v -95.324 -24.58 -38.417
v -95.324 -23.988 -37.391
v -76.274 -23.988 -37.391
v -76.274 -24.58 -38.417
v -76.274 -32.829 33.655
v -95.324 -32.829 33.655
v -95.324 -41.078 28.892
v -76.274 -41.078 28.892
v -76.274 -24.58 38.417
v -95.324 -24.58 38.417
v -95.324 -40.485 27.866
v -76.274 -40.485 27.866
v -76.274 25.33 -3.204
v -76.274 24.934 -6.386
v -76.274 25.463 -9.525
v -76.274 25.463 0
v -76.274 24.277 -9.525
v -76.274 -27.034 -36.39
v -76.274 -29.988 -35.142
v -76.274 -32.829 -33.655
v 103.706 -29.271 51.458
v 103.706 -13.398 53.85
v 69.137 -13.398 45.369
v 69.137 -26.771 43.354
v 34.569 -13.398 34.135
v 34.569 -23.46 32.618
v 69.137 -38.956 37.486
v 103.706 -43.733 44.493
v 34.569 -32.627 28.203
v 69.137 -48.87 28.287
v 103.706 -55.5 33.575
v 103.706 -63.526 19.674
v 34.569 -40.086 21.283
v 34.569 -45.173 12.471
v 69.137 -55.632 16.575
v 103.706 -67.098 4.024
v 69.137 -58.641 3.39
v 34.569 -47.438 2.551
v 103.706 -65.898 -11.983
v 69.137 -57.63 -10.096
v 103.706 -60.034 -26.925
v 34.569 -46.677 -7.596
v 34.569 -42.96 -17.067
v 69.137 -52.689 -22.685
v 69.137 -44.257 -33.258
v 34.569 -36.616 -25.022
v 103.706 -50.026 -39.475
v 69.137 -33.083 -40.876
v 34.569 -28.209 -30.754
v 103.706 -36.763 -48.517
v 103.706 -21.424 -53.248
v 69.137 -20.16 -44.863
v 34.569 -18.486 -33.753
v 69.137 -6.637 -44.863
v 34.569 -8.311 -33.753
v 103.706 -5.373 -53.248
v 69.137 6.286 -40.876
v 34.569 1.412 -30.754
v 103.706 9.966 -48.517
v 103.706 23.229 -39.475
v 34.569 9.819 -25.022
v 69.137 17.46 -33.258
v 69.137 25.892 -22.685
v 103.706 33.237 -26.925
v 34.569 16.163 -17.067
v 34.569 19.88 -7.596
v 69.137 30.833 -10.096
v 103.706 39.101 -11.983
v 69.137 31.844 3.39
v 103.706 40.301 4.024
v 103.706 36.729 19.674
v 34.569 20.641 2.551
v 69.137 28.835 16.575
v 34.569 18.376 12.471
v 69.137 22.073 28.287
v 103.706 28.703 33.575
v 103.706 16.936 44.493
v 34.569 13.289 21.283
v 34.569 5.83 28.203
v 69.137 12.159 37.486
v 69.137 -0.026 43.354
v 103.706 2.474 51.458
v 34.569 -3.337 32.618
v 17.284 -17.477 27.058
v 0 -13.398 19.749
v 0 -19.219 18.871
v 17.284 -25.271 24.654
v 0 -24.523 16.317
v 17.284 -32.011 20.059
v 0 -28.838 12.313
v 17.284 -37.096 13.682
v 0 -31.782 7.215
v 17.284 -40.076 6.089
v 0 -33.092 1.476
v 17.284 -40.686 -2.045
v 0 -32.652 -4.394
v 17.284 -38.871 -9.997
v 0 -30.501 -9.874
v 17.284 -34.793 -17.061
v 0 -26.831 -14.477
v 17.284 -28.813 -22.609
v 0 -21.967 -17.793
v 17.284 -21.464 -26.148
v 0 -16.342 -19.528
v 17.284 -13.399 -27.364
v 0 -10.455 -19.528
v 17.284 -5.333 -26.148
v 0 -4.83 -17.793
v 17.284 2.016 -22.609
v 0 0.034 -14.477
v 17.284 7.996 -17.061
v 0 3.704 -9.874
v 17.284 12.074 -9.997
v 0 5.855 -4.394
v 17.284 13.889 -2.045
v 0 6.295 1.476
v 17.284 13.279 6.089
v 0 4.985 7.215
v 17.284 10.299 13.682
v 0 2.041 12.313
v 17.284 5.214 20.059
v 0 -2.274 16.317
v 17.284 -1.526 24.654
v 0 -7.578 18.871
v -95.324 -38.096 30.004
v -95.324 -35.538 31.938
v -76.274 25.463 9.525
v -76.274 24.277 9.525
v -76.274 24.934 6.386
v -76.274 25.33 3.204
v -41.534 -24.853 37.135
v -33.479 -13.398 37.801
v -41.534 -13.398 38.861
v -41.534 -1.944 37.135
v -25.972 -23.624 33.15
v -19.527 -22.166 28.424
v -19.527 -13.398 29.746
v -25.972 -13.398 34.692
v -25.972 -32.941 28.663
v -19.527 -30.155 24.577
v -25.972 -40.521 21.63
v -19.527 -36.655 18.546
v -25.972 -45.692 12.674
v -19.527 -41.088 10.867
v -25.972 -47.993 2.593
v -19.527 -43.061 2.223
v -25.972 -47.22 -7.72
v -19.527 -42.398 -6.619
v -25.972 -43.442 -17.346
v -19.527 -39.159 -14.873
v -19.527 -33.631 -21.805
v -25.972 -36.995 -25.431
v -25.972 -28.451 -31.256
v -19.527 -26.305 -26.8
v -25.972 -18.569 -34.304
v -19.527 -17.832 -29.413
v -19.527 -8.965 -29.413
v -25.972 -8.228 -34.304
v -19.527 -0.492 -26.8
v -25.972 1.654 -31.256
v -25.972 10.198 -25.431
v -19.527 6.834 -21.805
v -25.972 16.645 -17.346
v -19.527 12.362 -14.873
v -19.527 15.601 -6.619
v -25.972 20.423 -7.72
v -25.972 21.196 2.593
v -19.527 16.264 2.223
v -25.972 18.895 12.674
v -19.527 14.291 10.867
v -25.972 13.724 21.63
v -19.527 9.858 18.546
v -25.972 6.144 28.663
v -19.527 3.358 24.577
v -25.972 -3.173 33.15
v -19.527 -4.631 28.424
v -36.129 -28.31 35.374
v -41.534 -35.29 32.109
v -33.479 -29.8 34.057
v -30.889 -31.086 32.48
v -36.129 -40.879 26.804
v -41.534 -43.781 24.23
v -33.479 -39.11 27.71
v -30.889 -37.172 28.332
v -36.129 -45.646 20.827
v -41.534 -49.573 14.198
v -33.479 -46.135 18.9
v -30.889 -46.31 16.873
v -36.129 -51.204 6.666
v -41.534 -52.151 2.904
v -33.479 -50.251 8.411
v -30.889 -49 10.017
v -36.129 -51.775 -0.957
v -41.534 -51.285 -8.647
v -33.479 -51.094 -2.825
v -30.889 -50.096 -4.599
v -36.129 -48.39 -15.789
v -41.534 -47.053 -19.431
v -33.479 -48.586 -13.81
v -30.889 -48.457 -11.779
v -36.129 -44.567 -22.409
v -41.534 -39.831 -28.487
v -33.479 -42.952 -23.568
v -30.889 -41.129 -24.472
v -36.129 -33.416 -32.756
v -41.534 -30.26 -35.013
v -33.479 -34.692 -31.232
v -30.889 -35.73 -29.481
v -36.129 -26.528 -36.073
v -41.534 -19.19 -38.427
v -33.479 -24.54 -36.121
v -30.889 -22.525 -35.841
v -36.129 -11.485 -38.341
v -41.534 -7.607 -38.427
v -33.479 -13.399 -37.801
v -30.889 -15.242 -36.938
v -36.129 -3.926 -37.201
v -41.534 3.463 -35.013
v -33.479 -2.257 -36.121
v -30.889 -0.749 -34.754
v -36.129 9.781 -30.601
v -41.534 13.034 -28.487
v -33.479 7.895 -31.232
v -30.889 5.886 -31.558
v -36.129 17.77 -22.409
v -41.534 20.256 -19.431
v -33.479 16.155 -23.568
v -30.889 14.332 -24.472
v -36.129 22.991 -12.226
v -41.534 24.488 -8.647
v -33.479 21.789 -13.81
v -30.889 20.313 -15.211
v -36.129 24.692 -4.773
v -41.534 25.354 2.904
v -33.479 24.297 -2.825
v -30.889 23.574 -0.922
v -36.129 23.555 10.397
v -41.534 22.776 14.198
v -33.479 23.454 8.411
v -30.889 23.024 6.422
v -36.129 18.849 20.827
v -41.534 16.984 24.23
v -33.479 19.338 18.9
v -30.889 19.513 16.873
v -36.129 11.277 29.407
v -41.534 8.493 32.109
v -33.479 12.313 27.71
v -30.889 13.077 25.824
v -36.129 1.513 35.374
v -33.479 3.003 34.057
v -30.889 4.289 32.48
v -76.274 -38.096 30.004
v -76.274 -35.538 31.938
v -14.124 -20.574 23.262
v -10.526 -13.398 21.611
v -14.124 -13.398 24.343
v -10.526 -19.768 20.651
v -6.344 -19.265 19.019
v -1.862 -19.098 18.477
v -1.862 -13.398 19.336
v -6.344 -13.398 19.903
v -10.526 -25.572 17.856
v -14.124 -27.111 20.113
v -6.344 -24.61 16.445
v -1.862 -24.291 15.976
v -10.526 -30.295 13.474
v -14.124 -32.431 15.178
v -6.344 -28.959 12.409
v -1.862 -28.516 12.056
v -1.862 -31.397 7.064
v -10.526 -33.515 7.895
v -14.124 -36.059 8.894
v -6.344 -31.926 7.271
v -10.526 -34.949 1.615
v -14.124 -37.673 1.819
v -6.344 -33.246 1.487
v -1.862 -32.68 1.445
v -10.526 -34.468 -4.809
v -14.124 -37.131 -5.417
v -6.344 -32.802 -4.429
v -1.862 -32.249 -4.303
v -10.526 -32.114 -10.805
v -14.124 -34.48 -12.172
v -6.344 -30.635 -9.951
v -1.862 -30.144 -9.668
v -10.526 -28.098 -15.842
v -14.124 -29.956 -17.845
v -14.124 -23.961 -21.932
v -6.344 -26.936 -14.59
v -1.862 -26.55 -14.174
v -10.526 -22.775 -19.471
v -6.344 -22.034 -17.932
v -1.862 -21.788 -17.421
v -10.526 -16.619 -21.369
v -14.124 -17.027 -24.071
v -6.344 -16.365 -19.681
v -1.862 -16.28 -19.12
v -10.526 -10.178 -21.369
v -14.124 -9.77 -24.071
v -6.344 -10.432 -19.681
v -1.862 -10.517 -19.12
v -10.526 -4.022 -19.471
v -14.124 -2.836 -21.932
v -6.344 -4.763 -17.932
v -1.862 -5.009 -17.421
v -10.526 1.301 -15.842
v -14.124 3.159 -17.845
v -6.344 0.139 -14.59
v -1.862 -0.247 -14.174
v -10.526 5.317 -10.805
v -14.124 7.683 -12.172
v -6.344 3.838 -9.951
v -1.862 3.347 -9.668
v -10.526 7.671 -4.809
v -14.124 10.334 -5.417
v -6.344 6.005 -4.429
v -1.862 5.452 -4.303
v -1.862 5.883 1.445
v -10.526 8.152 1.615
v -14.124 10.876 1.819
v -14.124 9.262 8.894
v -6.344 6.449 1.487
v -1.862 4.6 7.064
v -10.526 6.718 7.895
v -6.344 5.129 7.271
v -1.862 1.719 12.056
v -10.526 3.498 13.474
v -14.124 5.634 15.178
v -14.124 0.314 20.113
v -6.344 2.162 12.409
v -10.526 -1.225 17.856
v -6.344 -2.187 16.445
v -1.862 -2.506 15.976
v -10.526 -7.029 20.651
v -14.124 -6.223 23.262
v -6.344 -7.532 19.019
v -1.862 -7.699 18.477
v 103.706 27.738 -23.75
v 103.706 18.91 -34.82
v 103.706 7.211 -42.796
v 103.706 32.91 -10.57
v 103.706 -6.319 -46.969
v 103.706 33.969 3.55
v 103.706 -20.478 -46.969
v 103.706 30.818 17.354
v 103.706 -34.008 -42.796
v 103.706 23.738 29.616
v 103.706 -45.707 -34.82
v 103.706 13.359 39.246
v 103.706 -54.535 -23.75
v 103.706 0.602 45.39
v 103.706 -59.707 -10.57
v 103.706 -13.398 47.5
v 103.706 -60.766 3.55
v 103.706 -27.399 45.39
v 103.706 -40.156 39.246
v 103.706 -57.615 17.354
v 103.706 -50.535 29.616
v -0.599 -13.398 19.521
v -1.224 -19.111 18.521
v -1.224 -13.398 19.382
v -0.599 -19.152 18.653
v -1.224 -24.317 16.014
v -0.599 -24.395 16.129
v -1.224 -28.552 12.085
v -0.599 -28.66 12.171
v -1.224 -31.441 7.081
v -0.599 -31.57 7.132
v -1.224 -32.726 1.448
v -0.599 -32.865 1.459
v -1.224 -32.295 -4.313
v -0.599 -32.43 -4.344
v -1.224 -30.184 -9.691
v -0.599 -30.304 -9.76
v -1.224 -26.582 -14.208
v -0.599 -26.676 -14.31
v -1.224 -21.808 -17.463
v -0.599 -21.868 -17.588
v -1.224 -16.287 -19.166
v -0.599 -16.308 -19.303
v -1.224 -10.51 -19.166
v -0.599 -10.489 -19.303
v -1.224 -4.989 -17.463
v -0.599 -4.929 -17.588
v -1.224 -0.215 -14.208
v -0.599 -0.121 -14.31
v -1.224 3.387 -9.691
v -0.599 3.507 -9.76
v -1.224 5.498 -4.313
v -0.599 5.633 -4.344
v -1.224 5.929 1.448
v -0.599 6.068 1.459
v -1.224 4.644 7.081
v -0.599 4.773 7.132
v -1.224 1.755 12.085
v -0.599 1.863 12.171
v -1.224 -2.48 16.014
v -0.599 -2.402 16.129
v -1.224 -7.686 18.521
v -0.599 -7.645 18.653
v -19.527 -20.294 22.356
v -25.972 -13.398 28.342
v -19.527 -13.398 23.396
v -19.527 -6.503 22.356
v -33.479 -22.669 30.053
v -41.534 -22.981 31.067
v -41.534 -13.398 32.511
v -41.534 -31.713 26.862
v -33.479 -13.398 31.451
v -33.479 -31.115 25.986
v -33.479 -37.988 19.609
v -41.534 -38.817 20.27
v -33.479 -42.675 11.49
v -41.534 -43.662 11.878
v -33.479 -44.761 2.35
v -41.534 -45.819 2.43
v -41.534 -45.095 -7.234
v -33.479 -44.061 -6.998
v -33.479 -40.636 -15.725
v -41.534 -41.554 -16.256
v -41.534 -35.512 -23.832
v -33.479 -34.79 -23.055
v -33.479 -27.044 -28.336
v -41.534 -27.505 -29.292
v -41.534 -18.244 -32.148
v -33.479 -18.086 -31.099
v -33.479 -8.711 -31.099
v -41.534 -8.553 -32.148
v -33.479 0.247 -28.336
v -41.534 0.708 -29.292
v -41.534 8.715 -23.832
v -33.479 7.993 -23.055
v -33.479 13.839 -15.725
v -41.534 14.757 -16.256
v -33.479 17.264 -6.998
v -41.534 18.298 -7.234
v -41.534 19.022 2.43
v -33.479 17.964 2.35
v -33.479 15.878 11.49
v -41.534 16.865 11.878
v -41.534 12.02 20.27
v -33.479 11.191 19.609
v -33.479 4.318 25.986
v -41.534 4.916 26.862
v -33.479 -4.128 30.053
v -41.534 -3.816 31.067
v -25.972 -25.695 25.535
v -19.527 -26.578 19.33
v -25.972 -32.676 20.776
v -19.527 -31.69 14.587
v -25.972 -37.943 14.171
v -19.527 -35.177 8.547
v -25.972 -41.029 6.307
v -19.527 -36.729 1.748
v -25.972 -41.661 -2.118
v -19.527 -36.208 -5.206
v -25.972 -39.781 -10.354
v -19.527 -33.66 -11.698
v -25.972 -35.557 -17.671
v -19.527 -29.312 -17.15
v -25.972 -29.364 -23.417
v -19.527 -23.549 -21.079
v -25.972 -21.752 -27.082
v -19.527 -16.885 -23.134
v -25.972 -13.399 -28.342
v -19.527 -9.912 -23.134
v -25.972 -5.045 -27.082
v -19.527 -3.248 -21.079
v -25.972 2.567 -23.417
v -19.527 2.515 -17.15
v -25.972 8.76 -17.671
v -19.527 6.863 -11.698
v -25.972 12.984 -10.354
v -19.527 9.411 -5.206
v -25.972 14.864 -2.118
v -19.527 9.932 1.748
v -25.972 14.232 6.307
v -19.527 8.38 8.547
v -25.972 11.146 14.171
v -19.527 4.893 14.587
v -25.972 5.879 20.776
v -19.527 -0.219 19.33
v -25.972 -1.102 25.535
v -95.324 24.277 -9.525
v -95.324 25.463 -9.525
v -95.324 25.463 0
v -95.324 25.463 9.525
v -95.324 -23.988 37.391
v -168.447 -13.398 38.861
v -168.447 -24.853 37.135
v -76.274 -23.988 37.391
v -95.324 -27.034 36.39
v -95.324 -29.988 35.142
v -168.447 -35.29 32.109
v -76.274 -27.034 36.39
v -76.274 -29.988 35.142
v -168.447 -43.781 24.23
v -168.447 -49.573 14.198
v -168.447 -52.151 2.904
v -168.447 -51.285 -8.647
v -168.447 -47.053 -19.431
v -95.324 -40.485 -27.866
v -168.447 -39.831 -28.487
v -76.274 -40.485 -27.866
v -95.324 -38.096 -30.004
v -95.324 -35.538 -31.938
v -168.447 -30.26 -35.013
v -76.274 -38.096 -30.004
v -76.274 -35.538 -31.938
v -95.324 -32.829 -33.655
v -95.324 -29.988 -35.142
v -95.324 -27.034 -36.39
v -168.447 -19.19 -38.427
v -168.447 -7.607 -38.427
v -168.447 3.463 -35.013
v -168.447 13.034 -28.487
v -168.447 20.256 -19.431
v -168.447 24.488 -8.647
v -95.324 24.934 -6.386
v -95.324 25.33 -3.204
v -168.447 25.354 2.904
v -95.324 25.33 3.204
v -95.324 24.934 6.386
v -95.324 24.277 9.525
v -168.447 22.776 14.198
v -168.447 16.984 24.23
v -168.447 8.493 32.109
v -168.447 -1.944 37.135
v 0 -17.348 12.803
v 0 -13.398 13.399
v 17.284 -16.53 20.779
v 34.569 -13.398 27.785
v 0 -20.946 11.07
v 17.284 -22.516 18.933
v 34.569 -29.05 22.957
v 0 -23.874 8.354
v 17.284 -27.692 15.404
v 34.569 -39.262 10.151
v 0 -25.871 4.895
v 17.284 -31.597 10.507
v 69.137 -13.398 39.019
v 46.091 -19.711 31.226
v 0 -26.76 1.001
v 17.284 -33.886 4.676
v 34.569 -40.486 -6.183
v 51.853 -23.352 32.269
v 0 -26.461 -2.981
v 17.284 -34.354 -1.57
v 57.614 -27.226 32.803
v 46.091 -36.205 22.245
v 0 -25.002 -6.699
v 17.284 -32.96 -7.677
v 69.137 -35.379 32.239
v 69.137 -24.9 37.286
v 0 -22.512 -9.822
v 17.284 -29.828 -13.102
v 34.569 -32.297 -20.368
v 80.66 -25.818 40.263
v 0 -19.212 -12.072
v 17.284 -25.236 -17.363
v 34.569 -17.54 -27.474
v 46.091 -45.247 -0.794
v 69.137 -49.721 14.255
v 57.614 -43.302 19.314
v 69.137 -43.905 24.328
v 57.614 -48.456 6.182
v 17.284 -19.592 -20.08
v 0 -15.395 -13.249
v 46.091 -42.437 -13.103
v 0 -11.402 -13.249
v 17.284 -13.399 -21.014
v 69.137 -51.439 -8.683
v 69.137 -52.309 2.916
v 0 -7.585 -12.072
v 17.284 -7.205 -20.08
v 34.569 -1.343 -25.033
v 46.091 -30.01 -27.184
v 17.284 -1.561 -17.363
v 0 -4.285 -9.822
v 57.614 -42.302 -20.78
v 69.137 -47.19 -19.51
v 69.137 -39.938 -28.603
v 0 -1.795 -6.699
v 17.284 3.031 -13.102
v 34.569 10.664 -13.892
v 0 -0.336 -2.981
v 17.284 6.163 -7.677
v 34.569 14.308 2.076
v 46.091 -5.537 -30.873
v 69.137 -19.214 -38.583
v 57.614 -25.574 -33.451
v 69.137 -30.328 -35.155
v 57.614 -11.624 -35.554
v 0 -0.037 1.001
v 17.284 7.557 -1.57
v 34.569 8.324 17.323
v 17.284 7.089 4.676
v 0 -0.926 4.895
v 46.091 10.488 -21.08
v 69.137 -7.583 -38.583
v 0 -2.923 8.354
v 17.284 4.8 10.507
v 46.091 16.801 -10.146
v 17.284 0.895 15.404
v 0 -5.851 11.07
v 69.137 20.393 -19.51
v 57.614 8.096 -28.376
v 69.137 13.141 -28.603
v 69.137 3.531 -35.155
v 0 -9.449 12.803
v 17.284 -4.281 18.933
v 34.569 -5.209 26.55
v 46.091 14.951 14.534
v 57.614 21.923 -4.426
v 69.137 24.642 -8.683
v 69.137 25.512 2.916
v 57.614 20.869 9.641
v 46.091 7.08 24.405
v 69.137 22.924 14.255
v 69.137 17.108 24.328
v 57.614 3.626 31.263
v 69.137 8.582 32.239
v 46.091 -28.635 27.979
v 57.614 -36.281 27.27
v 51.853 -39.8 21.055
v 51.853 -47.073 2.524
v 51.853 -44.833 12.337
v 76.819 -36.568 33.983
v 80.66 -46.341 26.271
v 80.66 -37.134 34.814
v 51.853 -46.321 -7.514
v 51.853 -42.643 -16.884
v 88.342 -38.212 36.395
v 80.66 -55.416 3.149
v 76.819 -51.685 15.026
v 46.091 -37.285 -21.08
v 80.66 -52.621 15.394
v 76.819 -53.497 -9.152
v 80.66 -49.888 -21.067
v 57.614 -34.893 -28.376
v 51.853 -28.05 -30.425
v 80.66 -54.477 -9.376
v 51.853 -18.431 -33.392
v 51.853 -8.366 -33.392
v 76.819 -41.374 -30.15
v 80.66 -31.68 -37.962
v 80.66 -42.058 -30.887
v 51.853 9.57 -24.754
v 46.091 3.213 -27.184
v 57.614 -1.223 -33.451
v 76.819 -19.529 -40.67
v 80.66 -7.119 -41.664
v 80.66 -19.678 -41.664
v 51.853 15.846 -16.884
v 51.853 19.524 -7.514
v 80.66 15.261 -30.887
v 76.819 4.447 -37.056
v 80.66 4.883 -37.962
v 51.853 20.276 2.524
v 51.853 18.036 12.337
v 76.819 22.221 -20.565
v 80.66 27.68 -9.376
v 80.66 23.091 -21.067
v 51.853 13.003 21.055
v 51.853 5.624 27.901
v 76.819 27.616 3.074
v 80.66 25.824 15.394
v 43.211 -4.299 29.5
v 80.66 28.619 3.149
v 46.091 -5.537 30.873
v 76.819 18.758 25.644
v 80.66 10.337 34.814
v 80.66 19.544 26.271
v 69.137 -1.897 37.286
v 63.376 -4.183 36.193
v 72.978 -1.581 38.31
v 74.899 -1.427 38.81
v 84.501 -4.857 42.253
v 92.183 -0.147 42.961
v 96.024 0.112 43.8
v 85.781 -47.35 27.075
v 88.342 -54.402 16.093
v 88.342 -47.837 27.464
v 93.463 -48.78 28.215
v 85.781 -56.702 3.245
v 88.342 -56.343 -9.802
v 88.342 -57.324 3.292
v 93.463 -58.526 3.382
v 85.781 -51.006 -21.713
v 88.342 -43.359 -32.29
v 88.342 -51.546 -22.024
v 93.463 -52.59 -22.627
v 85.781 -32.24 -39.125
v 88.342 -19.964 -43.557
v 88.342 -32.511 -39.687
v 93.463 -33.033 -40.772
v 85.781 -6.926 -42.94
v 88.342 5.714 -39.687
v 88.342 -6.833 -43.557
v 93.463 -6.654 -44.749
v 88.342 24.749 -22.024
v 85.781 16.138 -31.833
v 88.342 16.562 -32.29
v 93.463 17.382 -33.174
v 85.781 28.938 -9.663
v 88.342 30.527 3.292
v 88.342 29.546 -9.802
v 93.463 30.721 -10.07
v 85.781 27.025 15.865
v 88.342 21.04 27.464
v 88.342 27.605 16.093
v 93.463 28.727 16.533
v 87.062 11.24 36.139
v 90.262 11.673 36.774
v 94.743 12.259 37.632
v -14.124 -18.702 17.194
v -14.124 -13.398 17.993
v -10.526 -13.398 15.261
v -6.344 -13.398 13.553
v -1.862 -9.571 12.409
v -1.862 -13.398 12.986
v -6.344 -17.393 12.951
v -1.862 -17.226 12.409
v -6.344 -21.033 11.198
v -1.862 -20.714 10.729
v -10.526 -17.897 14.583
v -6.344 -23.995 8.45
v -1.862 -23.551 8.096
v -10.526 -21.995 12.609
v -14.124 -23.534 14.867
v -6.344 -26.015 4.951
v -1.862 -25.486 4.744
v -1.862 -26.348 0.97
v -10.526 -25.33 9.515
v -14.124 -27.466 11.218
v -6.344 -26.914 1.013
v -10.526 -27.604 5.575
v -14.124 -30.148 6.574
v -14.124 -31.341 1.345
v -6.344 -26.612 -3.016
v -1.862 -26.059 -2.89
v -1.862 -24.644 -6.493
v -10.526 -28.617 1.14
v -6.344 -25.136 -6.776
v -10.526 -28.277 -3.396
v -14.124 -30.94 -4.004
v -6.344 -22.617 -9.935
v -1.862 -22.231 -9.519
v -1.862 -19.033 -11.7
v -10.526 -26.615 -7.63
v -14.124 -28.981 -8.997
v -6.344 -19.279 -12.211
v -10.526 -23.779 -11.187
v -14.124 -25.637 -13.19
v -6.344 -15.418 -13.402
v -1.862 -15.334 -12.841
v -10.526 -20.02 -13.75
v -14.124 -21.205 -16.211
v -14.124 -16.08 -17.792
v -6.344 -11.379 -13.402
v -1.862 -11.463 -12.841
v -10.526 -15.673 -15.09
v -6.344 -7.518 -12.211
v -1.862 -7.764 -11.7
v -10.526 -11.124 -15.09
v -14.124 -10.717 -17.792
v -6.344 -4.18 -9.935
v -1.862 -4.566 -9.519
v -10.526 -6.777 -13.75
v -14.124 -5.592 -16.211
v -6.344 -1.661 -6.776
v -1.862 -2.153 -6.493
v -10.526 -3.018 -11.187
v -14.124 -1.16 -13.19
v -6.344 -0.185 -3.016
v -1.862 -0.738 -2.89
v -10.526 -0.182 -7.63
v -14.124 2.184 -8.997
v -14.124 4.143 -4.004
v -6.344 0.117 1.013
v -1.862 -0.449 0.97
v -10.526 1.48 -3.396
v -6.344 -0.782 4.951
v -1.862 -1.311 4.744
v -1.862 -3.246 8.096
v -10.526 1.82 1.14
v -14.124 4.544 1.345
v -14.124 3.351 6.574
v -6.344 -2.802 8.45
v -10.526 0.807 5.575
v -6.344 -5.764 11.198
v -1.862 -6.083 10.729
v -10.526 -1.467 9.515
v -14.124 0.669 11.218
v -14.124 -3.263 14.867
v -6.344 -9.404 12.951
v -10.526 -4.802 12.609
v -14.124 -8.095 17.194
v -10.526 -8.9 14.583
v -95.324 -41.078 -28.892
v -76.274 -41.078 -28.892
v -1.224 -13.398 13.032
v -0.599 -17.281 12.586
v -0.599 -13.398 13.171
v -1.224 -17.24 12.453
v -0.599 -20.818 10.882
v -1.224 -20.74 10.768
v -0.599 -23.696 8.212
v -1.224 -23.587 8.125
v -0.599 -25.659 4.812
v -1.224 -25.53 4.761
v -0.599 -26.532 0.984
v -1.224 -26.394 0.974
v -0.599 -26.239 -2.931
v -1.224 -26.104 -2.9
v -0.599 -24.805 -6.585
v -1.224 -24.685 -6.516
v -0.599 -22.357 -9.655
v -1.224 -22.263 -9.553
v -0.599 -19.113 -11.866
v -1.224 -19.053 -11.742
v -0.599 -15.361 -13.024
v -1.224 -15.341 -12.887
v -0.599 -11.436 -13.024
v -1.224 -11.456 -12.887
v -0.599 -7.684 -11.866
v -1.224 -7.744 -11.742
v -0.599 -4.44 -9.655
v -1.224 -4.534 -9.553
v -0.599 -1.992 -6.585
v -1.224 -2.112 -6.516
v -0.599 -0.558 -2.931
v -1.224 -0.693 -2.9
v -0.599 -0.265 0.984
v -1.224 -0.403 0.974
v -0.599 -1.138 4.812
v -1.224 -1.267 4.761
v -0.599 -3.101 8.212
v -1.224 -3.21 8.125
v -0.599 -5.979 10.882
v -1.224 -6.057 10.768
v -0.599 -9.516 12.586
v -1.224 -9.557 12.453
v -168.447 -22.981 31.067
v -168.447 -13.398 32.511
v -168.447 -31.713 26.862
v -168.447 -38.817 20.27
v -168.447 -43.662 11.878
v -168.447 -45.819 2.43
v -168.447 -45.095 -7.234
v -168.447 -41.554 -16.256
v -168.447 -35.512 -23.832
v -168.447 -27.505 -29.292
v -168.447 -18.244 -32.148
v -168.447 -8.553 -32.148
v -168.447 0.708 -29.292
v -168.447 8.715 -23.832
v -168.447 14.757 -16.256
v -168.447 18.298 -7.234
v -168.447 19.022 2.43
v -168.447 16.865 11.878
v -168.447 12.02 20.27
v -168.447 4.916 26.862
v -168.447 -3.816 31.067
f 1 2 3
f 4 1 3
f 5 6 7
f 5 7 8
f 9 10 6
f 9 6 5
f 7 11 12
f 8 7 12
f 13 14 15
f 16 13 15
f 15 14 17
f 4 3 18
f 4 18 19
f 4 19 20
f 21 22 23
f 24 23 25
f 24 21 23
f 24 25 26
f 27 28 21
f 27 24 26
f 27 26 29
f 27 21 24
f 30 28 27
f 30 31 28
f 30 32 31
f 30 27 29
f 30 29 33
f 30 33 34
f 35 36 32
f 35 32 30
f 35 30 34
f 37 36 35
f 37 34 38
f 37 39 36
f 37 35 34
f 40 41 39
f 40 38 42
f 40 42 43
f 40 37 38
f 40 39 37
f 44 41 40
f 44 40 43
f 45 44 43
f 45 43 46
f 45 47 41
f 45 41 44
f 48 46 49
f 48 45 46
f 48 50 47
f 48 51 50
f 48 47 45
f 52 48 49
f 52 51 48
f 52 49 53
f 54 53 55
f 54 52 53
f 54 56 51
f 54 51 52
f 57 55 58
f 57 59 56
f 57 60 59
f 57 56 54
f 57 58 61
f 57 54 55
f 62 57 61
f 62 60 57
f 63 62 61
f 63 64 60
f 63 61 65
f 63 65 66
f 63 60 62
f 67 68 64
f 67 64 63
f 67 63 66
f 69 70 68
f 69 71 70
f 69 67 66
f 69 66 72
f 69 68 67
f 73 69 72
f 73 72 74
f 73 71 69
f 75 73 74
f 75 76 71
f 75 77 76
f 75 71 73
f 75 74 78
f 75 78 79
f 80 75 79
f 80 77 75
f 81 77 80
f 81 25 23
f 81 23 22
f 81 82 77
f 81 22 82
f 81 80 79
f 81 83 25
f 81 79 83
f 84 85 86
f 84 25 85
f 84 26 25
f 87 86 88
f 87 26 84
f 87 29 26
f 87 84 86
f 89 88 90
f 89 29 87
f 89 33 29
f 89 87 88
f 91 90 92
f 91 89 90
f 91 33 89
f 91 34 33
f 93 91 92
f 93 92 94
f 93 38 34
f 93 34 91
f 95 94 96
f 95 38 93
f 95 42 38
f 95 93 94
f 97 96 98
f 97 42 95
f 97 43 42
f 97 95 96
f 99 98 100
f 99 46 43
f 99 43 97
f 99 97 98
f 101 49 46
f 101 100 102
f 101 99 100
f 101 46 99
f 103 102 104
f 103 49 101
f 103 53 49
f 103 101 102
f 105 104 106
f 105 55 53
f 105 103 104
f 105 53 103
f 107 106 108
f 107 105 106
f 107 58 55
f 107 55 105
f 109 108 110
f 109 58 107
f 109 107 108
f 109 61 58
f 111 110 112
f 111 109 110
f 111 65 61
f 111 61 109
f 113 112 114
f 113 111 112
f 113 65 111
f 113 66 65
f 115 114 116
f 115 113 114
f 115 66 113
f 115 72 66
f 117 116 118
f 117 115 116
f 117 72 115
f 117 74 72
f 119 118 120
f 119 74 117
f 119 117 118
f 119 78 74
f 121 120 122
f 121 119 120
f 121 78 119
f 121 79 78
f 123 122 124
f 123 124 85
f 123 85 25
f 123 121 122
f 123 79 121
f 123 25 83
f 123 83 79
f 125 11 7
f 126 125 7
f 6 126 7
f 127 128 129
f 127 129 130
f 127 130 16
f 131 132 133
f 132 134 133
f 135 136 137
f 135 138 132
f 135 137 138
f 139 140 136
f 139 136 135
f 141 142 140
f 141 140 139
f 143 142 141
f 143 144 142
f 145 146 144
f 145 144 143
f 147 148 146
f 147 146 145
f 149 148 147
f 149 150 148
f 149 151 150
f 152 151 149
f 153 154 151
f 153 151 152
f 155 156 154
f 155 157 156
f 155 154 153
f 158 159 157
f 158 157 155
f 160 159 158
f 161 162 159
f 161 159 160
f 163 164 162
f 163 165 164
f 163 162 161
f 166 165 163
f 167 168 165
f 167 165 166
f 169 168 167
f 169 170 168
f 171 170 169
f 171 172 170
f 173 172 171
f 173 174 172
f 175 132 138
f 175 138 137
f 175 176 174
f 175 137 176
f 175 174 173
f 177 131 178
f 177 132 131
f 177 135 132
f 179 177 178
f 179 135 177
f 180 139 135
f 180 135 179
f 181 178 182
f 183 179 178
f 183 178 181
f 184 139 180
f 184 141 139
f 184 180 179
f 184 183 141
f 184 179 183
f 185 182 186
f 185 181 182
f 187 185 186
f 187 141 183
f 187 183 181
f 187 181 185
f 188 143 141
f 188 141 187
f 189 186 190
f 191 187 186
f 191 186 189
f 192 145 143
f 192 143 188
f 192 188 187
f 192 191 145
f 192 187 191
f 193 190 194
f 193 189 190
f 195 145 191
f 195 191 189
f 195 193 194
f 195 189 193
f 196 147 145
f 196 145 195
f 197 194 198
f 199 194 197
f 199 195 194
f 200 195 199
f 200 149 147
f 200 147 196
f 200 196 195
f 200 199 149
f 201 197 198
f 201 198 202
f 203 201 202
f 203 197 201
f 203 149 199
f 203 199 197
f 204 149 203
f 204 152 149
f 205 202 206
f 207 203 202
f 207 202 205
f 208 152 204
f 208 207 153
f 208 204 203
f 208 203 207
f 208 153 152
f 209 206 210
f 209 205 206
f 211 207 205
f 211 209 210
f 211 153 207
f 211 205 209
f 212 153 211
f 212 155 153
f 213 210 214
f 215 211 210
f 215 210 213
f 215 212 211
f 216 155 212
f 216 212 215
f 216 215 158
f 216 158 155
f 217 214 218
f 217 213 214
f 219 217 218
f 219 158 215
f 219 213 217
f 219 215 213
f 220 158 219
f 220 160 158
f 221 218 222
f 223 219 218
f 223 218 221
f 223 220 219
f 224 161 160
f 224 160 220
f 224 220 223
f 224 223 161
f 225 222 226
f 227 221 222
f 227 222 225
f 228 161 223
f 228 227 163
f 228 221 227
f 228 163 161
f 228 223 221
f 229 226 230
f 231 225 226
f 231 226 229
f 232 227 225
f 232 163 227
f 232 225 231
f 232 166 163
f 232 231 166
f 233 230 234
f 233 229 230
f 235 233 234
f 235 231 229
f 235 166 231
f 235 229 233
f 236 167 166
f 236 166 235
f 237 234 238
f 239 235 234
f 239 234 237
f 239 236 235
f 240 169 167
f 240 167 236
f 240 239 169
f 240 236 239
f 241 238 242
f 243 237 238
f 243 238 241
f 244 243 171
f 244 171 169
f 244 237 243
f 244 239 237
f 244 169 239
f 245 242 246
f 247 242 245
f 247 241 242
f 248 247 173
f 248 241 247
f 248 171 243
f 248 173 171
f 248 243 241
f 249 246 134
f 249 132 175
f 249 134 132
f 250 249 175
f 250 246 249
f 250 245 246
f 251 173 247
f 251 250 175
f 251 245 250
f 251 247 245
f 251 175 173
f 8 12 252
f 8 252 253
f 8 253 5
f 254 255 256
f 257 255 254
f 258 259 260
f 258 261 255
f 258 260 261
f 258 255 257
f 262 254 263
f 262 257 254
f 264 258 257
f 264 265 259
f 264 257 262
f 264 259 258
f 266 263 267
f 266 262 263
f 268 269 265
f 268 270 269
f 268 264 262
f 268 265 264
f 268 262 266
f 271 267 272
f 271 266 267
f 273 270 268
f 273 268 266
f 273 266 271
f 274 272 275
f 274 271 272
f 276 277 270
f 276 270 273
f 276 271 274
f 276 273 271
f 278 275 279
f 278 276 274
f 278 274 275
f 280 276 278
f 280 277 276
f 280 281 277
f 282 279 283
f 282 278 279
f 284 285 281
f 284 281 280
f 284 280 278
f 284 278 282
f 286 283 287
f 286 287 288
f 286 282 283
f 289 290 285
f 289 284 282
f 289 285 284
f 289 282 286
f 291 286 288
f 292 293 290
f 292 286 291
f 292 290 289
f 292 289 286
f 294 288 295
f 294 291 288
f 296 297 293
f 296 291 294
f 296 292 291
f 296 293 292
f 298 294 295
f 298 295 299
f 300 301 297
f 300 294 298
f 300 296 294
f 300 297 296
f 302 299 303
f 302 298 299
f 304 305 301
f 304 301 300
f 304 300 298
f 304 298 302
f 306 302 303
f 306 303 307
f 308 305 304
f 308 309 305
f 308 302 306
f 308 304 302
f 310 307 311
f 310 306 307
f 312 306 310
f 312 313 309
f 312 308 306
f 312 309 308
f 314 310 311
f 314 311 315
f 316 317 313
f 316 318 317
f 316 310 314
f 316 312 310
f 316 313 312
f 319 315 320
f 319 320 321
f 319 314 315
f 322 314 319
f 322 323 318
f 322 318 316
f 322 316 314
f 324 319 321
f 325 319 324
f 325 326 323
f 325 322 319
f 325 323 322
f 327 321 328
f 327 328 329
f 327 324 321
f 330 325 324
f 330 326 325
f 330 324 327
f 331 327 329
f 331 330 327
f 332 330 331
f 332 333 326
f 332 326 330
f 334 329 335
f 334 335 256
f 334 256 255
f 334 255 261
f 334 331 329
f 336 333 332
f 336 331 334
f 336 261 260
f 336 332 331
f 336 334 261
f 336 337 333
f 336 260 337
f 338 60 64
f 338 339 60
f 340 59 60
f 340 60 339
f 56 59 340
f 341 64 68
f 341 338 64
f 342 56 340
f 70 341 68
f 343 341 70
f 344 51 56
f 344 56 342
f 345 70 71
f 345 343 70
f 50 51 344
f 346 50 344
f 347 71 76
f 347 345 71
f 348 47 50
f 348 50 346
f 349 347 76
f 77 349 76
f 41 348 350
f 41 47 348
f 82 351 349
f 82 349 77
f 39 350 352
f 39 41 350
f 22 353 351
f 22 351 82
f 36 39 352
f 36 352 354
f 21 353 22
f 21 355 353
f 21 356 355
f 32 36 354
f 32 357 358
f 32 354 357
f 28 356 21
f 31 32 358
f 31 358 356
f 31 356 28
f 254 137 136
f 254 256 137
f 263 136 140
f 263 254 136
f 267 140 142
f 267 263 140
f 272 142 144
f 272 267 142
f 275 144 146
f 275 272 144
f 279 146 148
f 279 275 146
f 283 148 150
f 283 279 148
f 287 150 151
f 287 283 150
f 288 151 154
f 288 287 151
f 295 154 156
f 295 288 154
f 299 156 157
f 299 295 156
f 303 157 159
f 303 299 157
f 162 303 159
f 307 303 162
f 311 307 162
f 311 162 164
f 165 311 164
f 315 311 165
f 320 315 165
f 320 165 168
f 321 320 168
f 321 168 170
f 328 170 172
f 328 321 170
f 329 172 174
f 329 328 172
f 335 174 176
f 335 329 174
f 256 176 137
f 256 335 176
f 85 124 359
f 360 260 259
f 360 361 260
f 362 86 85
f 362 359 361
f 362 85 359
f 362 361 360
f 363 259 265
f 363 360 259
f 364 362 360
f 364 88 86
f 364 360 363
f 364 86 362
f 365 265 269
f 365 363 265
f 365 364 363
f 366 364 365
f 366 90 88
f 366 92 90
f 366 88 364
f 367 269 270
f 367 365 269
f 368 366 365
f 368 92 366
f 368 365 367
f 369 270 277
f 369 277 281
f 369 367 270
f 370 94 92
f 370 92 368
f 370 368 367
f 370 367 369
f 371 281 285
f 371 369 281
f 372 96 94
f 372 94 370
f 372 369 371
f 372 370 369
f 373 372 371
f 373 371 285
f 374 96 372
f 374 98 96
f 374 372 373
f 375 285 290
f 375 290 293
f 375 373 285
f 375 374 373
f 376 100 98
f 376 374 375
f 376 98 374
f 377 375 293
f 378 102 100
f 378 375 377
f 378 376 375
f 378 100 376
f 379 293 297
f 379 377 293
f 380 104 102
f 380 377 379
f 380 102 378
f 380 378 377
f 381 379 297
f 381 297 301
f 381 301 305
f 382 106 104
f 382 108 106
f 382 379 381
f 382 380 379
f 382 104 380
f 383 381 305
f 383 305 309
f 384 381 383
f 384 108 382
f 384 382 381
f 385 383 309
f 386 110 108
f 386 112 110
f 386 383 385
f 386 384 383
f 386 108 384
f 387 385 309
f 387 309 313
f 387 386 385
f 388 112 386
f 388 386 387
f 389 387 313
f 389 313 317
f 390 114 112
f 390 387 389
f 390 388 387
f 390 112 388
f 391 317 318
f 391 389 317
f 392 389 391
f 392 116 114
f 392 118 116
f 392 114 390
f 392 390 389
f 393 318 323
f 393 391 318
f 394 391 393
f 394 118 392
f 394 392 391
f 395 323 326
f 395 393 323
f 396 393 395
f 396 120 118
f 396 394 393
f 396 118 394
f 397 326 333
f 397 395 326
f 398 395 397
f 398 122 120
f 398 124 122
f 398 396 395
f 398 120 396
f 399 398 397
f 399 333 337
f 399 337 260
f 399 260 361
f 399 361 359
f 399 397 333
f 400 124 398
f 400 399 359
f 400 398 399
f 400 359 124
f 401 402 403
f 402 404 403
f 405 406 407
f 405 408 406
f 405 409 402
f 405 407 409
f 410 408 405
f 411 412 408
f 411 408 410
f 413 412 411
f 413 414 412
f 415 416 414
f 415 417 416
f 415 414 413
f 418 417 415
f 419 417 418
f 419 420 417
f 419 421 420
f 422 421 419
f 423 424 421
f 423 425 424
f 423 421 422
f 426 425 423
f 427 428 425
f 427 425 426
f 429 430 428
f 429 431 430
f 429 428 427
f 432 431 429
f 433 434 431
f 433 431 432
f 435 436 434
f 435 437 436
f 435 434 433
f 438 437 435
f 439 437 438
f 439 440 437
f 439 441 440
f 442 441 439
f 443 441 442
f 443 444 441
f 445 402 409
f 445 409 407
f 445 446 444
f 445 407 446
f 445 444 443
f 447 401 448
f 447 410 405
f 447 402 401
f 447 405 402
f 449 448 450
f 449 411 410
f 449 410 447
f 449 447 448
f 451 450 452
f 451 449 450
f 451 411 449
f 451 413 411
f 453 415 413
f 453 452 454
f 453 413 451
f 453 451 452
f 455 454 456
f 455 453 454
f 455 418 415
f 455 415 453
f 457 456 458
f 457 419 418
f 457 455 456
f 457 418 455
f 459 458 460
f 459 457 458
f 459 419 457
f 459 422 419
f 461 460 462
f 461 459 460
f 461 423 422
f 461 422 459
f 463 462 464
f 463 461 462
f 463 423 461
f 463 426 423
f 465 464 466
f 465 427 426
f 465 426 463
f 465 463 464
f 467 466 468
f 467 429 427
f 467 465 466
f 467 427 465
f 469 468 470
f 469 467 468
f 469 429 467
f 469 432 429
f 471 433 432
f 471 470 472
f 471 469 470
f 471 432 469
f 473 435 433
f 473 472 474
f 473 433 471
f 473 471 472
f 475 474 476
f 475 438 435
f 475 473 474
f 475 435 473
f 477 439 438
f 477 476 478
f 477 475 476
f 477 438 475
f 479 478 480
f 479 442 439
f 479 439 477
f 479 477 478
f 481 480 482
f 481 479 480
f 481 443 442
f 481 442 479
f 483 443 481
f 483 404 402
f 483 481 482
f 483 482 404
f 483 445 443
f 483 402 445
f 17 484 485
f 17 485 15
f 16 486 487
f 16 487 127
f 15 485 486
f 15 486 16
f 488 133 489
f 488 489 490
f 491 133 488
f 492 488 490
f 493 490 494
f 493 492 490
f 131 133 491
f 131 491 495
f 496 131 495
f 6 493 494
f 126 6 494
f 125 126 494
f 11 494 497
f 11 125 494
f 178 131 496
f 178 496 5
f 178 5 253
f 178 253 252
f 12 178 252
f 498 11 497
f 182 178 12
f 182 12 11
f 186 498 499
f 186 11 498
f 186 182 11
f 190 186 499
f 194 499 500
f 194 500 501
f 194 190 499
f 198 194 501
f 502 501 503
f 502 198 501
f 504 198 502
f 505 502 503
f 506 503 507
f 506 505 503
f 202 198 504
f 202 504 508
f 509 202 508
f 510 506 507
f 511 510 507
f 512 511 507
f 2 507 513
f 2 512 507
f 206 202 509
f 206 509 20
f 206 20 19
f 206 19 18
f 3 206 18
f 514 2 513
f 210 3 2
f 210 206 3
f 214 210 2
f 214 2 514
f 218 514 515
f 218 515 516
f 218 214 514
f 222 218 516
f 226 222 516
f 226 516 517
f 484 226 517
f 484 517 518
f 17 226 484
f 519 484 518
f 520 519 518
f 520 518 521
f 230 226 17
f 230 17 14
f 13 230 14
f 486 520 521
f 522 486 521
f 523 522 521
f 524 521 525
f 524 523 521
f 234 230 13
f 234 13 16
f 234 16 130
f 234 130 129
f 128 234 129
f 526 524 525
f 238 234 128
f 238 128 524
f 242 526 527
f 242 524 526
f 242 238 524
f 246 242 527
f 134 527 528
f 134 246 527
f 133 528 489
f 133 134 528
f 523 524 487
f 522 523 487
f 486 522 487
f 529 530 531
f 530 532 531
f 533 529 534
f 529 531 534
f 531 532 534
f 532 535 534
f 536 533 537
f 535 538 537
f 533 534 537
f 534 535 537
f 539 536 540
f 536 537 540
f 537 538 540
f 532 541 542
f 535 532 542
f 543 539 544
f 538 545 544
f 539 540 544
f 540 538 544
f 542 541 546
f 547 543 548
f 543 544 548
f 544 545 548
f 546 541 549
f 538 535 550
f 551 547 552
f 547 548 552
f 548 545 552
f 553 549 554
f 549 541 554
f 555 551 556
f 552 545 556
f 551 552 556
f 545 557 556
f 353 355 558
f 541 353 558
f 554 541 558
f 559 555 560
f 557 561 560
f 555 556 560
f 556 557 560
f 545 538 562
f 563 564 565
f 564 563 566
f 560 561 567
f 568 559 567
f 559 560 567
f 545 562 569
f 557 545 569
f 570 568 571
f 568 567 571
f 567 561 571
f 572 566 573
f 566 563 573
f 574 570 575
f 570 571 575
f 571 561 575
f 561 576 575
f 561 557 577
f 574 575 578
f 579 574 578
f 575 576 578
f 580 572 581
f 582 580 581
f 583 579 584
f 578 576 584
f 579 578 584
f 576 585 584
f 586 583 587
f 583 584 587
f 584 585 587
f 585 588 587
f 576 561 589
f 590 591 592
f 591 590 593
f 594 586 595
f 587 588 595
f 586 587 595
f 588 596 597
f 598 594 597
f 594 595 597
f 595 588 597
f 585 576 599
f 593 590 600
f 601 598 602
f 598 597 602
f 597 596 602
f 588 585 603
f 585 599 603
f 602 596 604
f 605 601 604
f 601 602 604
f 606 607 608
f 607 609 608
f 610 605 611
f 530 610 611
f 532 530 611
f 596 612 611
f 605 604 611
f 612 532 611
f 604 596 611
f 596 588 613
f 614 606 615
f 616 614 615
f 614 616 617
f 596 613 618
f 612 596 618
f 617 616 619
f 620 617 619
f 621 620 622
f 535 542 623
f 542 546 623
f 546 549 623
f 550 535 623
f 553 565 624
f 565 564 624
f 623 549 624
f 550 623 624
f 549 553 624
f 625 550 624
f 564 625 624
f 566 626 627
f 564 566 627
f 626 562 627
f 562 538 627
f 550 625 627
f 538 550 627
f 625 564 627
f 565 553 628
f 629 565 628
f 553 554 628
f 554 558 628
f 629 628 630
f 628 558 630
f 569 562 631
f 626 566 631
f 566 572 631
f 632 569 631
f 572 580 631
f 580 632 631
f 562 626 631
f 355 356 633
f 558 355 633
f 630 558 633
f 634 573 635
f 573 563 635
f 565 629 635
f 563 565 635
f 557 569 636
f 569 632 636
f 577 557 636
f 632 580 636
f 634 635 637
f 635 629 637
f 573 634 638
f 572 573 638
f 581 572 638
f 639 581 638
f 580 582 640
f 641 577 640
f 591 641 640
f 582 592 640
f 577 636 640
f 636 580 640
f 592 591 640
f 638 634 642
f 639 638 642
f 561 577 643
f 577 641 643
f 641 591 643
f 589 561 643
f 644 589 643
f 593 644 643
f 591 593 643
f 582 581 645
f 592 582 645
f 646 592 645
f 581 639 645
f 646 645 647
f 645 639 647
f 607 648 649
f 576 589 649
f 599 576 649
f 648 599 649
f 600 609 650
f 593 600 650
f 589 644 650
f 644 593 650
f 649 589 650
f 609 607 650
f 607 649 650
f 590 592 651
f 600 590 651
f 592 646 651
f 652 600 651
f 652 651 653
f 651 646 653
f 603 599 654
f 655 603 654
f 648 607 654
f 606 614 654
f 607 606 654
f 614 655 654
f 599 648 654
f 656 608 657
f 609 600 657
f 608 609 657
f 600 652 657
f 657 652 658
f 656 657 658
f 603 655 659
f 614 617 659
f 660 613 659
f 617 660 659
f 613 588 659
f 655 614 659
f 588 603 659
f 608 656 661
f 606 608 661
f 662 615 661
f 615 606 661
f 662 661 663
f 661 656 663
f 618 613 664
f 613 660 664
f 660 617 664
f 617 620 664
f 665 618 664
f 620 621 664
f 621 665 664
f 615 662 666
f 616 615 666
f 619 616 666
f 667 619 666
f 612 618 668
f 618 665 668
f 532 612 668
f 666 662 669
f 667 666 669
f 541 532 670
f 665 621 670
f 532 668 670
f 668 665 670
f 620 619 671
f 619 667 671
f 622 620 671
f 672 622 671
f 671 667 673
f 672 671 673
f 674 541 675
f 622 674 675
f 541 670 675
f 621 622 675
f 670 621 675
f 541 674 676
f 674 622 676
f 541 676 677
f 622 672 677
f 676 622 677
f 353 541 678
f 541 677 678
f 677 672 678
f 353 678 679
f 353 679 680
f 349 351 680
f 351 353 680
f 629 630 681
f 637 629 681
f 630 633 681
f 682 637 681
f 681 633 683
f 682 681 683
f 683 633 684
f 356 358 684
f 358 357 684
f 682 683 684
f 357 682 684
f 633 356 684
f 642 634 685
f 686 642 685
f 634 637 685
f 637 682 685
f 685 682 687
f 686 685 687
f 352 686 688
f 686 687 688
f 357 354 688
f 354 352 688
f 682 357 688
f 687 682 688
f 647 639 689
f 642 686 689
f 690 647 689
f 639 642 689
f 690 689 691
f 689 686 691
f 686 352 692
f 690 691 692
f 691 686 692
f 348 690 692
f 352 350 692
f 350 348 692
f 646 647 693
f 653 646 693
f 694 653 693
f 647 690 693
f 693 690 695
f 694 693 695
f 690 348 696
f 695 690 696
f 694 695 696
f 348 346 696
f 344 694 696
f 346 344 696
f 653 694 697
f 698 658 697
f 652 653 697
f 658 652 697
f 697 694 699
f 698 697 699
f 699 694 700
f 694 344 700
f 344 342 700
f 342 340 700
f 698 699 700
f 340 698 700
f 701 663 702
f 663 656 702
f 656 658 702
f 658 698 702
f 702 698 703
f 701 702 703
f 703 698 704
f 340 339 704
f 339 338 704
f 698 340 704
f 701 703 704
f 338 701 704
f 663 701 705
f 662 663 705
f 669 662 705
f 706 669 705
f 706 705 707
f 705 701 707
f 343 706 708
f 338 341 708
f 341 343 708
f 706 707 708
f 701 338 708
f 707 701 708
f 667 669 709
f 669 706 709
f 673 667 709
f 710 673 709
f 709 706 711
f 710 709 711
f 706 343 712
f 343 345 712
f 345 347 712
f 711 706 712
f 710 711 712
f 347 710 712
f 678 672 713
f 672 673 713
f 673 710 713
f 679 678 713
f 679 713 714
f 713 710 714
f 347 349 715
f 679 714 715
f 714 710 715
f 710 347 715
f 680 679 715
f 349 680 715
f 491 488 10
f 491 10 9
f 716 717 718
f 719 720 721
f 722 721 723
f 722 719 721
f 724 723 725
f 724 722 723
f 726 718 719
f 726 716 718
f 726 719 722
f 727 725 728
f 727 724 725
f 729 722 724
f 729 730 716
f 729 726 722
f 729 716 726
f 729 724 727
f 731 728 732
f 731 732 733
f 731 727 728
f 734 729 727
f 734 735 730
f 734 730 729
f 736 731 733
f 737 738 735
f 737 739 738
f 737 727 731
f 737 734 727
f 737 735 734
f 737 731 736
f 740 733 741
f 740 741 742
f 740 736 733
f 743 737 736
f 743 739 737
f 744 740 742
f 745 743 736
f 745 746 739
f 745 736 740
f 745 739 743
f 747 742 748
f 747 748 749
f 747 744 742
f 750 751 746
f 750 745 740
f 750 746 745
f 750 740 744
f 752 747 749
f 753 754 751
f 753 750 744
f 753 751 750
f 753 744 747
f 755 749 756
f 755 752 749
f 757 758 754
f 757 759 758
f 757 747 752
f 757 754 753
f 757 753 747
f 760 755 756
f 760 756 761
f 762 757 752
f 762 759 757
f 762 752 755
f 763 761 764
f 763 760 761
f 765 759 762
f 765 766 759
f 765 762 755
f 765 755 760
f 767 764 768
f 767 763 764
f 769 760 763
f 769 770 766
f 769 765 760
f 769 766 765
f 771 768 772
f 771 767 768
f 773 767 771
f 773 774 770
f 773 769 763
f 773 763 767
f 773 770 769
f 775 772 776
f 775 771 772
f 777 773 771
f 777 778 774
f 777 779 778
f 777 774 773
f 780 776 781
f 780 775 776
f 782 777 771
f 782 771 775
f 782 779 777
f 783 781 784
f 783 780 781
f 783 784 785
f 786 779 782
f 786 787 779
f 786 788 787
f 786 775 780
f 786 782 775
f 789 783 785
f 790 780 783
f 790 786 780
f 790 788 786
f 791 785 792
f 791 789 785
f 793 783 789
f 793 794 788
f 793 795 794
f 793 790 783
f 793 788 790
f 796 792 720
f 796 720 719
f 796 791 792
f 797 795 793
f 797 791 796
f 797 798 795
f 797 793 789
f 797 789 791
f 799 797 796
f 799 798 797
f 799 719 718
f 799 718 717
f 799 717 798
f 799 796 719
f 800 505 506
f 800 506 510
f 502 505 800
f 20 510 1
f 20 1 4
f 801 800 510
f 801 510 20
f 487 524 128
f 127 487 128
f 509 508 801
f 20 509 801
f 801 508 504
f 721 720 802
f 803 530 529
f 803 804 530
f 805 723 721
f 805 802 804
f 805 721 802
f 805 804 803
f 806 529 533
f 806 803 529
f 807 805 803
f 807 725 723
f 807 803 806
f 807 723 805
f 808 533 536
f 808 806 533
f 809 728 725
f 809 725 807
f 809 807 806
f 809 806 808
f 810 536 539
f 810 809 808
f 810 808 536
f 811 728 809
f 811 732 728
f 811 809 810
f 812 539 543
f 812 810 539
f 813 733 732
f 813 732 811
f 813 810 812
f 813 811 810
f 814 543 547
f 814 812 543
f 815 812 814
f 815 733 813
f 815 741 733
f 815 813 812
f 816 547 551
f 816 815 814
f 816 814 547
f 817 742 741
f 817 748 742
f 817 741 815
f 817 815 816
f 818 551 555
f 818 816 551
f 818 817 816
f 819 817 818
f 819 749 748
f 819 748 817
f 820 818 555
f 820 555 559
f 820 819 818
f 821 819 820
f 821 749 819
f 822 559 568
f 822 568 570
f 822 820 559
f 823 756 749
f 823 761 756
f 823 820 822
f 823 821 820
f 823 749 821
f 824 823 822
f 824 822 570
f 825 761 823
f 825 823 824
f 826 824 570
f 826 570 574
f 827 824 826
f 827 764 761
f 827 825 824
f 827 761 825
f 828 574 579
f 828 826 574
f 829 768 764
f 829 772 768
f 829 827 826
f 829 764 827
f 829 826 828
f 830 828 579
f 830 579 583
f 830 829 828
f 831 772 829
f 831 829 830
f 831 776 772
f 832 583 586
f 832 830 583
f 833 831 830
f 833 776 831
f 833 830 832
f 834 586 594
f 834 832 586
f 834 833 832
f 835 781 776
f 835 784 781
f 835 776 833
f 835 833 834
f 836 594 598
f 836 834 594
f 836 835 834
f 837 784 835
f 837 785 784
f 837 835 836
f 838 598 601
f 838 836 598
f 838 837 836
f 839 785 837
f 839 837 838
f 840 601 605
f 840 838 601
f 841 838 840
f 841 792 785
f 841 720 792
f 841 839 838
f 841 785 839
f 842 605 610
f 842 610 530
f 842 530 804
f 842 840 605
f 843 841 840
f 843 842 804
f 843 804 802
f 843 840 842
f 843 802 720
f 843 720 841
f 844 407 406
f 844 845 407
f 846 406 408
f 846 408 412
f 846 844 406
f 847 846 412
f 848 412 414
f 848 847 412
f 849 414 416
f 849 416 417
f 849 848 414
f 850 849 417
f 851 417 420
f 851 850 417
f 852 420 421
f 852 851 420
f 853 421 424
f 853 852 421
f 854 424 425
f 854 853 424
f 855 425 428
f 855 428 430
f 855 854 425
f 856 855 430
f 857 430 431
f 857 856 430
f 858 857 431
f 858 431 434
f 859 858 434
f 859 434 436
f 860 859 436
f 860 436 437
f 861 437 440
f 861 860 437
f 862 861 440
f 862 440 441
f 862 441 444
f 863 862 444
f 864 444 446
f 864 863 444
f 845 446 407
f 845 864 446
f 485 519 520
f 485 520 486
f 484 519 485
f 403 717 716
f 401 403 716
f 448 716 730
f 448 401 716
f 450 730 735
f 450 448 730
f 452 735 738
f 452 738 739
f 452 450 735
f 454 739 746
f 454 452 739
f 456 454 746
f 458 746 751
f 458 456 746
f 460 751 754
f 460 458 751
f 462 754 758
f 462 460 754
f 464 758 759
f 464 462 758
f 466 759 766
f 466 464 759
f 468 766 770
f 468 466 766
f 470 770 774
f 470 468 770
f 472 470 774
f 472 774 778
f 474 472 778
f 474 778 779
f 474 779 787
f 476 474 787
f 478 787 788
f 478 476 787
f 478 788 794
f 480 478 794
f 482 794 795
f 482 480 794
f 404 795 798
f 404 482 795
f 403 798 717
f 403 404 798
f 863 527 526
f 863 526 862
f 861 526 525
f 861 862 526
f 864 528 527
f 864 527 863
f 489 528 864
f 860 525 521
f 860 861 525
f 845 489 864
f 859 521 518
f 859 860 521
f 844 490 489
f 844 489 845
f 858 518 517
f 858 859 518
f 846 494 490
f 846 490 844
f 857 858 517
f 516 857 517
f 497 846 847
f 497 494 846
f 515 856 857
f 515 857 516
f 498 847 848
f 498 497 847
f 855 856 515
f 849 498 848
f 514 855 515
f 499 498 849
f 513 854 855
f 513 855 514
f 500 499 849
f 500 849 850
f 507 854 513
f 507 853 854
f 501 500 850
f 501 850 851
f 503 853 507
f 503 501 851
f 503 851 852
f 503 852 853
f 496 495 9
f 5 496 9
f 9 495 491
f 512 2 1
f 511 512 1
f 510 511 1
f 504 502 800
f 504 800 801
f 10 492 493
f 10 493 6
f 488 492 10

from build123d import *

# Parameters (mm, degrees)
BOSS_EXTRUDE1_START = -1.185383
SKETCH2_W           = 19.05
SKETCH2_H           = 19.05
BOSS_EXTRUDE1_DEPTH = 1.185383
CIRPATTERN1_COUNT   = 3


with BuildPart() as part:
    # Sketch1 → Revolve1 (revolve)
    with BuildSketch(Plane.XY, mode=Mode.PRIVATE) as revolve1_sk:
        with BuildLine():
            Line((-14.12409666, 4.594554961), (-19.526618742, 9.997077044))
            ThreePointArc((-19.526618742, 9.997077044), (-29.623523347, 16.74361301), (-41.533634393, 19.112681394))
            Line((-41.533634393, 19.112681394), (-168.447274393, 19.112681394))
            Line((-168.447274393, 19.112681394), (-168.447274393, 25.462681394))
            Line((-168.447274393, 25.462681394), (-41.533634392, 25.462681394))
            ThreePointArc((-41.533634392, 25.462681394), (-29.623523346, 23.09361301), (-19.526618741, 16.347077044))
            Line((-19.526618741, 16.347077044), (-14.124096659, 10.944554962))
            ThreePointArc((-14.124096659, 10.944554962), (-8.491312805, 7.221332923), (-1.862483701, 5.937097346))
            ThreePointArc((-1.862483701, 5.937097346), (-0.908631777, 6.041561122), (-5.2e-08, 6.350000031))
            add(Edge.make_bspline(
                [(-5.2e-08, 6.350000031), (17.284276617, 14.409337901), (34.568553286, 21.376197316), (51.852829955, 27.377015197), (69.137106624, 32.507005795), (86.421383293, 36.843575686), (103.705659962, 40.451419137)],
                knots=[0.079490439, 0.079490439, 0.079490439, 0.079490439, 0.079490439, 0.079490439, 0.079490439, 0.916317313, 0.916317313, 0.916317313, 0.916317313, 0.916317313, 0.916317313, 0.916317313], degree=6))
            Line((103.705659962, 40.451419137), (103.705659962, 34.101419137))
            add(Edge.make_bspline(
                [(-5.3e-08, 3e-08), (17.284276616, 8.059337901), (34.568553285, 15.026197315), (51.852829954, 21.027015196), (69.137106623, 26.157005795), (86.421383292, 30.493575686), (103.705659962, 34.101419137)],
                knots=[0.079490439, 0.079490439, 0.079490439, 0.079490439, 0.079490439, 0.079490439, 0.079490439, 0.916317313, 0.916317313, 0.916317313, 0.916317313, 0.916317313, 0.916317313, 0.916317313], degree=6))
            ThreePointArc((-5.3e-08, 3e-08), (-0.908631778, -0.308438879), (-1.862483702, -0.412902654))
            ThreePointArc((-1.862483702, -0.412902654), (-8.491312805, 0.871332923), (-14.12409666, 4.594554961))
        make_face()
    revolve(revolve1_sk.sketch.rotate(Axis((-168.447274484, -13.3985, 0), (1, 0, 0)), 90), axis=Axis((-168.447274484, -13.3985, 0), (1, 0, 0)))

    # Sketch2 → Boss-Extrude1 (add)
    with BuildSketch(Plane(origin=(0, 25.462681394, 0), x_dir=(1, 0, 0), z_dir=(0, 1, 0)).offset(BOSS_EXTRUDE1_START)):
        with Locations((-85.799287115, 0)):
            Rectangle(SKETCH2_W, SKETCH2_H)
    boss_extrude1 = extrude(amount=BOSS_EXTRUDE1_DEPTH)

    # CirPattern1: Boss-Extrude1 ×3 about axis
    cirpattern1_axis = Axis((0, -13.3985, 0), (1, 0, 0))
    for i in range(1, CIRPATTERN1_COUNT):
        add(boss_extrude1.rotate(cirpattern1_axis, i * 360 / CIRPATTERN1_COUNT))


solid = part.part
